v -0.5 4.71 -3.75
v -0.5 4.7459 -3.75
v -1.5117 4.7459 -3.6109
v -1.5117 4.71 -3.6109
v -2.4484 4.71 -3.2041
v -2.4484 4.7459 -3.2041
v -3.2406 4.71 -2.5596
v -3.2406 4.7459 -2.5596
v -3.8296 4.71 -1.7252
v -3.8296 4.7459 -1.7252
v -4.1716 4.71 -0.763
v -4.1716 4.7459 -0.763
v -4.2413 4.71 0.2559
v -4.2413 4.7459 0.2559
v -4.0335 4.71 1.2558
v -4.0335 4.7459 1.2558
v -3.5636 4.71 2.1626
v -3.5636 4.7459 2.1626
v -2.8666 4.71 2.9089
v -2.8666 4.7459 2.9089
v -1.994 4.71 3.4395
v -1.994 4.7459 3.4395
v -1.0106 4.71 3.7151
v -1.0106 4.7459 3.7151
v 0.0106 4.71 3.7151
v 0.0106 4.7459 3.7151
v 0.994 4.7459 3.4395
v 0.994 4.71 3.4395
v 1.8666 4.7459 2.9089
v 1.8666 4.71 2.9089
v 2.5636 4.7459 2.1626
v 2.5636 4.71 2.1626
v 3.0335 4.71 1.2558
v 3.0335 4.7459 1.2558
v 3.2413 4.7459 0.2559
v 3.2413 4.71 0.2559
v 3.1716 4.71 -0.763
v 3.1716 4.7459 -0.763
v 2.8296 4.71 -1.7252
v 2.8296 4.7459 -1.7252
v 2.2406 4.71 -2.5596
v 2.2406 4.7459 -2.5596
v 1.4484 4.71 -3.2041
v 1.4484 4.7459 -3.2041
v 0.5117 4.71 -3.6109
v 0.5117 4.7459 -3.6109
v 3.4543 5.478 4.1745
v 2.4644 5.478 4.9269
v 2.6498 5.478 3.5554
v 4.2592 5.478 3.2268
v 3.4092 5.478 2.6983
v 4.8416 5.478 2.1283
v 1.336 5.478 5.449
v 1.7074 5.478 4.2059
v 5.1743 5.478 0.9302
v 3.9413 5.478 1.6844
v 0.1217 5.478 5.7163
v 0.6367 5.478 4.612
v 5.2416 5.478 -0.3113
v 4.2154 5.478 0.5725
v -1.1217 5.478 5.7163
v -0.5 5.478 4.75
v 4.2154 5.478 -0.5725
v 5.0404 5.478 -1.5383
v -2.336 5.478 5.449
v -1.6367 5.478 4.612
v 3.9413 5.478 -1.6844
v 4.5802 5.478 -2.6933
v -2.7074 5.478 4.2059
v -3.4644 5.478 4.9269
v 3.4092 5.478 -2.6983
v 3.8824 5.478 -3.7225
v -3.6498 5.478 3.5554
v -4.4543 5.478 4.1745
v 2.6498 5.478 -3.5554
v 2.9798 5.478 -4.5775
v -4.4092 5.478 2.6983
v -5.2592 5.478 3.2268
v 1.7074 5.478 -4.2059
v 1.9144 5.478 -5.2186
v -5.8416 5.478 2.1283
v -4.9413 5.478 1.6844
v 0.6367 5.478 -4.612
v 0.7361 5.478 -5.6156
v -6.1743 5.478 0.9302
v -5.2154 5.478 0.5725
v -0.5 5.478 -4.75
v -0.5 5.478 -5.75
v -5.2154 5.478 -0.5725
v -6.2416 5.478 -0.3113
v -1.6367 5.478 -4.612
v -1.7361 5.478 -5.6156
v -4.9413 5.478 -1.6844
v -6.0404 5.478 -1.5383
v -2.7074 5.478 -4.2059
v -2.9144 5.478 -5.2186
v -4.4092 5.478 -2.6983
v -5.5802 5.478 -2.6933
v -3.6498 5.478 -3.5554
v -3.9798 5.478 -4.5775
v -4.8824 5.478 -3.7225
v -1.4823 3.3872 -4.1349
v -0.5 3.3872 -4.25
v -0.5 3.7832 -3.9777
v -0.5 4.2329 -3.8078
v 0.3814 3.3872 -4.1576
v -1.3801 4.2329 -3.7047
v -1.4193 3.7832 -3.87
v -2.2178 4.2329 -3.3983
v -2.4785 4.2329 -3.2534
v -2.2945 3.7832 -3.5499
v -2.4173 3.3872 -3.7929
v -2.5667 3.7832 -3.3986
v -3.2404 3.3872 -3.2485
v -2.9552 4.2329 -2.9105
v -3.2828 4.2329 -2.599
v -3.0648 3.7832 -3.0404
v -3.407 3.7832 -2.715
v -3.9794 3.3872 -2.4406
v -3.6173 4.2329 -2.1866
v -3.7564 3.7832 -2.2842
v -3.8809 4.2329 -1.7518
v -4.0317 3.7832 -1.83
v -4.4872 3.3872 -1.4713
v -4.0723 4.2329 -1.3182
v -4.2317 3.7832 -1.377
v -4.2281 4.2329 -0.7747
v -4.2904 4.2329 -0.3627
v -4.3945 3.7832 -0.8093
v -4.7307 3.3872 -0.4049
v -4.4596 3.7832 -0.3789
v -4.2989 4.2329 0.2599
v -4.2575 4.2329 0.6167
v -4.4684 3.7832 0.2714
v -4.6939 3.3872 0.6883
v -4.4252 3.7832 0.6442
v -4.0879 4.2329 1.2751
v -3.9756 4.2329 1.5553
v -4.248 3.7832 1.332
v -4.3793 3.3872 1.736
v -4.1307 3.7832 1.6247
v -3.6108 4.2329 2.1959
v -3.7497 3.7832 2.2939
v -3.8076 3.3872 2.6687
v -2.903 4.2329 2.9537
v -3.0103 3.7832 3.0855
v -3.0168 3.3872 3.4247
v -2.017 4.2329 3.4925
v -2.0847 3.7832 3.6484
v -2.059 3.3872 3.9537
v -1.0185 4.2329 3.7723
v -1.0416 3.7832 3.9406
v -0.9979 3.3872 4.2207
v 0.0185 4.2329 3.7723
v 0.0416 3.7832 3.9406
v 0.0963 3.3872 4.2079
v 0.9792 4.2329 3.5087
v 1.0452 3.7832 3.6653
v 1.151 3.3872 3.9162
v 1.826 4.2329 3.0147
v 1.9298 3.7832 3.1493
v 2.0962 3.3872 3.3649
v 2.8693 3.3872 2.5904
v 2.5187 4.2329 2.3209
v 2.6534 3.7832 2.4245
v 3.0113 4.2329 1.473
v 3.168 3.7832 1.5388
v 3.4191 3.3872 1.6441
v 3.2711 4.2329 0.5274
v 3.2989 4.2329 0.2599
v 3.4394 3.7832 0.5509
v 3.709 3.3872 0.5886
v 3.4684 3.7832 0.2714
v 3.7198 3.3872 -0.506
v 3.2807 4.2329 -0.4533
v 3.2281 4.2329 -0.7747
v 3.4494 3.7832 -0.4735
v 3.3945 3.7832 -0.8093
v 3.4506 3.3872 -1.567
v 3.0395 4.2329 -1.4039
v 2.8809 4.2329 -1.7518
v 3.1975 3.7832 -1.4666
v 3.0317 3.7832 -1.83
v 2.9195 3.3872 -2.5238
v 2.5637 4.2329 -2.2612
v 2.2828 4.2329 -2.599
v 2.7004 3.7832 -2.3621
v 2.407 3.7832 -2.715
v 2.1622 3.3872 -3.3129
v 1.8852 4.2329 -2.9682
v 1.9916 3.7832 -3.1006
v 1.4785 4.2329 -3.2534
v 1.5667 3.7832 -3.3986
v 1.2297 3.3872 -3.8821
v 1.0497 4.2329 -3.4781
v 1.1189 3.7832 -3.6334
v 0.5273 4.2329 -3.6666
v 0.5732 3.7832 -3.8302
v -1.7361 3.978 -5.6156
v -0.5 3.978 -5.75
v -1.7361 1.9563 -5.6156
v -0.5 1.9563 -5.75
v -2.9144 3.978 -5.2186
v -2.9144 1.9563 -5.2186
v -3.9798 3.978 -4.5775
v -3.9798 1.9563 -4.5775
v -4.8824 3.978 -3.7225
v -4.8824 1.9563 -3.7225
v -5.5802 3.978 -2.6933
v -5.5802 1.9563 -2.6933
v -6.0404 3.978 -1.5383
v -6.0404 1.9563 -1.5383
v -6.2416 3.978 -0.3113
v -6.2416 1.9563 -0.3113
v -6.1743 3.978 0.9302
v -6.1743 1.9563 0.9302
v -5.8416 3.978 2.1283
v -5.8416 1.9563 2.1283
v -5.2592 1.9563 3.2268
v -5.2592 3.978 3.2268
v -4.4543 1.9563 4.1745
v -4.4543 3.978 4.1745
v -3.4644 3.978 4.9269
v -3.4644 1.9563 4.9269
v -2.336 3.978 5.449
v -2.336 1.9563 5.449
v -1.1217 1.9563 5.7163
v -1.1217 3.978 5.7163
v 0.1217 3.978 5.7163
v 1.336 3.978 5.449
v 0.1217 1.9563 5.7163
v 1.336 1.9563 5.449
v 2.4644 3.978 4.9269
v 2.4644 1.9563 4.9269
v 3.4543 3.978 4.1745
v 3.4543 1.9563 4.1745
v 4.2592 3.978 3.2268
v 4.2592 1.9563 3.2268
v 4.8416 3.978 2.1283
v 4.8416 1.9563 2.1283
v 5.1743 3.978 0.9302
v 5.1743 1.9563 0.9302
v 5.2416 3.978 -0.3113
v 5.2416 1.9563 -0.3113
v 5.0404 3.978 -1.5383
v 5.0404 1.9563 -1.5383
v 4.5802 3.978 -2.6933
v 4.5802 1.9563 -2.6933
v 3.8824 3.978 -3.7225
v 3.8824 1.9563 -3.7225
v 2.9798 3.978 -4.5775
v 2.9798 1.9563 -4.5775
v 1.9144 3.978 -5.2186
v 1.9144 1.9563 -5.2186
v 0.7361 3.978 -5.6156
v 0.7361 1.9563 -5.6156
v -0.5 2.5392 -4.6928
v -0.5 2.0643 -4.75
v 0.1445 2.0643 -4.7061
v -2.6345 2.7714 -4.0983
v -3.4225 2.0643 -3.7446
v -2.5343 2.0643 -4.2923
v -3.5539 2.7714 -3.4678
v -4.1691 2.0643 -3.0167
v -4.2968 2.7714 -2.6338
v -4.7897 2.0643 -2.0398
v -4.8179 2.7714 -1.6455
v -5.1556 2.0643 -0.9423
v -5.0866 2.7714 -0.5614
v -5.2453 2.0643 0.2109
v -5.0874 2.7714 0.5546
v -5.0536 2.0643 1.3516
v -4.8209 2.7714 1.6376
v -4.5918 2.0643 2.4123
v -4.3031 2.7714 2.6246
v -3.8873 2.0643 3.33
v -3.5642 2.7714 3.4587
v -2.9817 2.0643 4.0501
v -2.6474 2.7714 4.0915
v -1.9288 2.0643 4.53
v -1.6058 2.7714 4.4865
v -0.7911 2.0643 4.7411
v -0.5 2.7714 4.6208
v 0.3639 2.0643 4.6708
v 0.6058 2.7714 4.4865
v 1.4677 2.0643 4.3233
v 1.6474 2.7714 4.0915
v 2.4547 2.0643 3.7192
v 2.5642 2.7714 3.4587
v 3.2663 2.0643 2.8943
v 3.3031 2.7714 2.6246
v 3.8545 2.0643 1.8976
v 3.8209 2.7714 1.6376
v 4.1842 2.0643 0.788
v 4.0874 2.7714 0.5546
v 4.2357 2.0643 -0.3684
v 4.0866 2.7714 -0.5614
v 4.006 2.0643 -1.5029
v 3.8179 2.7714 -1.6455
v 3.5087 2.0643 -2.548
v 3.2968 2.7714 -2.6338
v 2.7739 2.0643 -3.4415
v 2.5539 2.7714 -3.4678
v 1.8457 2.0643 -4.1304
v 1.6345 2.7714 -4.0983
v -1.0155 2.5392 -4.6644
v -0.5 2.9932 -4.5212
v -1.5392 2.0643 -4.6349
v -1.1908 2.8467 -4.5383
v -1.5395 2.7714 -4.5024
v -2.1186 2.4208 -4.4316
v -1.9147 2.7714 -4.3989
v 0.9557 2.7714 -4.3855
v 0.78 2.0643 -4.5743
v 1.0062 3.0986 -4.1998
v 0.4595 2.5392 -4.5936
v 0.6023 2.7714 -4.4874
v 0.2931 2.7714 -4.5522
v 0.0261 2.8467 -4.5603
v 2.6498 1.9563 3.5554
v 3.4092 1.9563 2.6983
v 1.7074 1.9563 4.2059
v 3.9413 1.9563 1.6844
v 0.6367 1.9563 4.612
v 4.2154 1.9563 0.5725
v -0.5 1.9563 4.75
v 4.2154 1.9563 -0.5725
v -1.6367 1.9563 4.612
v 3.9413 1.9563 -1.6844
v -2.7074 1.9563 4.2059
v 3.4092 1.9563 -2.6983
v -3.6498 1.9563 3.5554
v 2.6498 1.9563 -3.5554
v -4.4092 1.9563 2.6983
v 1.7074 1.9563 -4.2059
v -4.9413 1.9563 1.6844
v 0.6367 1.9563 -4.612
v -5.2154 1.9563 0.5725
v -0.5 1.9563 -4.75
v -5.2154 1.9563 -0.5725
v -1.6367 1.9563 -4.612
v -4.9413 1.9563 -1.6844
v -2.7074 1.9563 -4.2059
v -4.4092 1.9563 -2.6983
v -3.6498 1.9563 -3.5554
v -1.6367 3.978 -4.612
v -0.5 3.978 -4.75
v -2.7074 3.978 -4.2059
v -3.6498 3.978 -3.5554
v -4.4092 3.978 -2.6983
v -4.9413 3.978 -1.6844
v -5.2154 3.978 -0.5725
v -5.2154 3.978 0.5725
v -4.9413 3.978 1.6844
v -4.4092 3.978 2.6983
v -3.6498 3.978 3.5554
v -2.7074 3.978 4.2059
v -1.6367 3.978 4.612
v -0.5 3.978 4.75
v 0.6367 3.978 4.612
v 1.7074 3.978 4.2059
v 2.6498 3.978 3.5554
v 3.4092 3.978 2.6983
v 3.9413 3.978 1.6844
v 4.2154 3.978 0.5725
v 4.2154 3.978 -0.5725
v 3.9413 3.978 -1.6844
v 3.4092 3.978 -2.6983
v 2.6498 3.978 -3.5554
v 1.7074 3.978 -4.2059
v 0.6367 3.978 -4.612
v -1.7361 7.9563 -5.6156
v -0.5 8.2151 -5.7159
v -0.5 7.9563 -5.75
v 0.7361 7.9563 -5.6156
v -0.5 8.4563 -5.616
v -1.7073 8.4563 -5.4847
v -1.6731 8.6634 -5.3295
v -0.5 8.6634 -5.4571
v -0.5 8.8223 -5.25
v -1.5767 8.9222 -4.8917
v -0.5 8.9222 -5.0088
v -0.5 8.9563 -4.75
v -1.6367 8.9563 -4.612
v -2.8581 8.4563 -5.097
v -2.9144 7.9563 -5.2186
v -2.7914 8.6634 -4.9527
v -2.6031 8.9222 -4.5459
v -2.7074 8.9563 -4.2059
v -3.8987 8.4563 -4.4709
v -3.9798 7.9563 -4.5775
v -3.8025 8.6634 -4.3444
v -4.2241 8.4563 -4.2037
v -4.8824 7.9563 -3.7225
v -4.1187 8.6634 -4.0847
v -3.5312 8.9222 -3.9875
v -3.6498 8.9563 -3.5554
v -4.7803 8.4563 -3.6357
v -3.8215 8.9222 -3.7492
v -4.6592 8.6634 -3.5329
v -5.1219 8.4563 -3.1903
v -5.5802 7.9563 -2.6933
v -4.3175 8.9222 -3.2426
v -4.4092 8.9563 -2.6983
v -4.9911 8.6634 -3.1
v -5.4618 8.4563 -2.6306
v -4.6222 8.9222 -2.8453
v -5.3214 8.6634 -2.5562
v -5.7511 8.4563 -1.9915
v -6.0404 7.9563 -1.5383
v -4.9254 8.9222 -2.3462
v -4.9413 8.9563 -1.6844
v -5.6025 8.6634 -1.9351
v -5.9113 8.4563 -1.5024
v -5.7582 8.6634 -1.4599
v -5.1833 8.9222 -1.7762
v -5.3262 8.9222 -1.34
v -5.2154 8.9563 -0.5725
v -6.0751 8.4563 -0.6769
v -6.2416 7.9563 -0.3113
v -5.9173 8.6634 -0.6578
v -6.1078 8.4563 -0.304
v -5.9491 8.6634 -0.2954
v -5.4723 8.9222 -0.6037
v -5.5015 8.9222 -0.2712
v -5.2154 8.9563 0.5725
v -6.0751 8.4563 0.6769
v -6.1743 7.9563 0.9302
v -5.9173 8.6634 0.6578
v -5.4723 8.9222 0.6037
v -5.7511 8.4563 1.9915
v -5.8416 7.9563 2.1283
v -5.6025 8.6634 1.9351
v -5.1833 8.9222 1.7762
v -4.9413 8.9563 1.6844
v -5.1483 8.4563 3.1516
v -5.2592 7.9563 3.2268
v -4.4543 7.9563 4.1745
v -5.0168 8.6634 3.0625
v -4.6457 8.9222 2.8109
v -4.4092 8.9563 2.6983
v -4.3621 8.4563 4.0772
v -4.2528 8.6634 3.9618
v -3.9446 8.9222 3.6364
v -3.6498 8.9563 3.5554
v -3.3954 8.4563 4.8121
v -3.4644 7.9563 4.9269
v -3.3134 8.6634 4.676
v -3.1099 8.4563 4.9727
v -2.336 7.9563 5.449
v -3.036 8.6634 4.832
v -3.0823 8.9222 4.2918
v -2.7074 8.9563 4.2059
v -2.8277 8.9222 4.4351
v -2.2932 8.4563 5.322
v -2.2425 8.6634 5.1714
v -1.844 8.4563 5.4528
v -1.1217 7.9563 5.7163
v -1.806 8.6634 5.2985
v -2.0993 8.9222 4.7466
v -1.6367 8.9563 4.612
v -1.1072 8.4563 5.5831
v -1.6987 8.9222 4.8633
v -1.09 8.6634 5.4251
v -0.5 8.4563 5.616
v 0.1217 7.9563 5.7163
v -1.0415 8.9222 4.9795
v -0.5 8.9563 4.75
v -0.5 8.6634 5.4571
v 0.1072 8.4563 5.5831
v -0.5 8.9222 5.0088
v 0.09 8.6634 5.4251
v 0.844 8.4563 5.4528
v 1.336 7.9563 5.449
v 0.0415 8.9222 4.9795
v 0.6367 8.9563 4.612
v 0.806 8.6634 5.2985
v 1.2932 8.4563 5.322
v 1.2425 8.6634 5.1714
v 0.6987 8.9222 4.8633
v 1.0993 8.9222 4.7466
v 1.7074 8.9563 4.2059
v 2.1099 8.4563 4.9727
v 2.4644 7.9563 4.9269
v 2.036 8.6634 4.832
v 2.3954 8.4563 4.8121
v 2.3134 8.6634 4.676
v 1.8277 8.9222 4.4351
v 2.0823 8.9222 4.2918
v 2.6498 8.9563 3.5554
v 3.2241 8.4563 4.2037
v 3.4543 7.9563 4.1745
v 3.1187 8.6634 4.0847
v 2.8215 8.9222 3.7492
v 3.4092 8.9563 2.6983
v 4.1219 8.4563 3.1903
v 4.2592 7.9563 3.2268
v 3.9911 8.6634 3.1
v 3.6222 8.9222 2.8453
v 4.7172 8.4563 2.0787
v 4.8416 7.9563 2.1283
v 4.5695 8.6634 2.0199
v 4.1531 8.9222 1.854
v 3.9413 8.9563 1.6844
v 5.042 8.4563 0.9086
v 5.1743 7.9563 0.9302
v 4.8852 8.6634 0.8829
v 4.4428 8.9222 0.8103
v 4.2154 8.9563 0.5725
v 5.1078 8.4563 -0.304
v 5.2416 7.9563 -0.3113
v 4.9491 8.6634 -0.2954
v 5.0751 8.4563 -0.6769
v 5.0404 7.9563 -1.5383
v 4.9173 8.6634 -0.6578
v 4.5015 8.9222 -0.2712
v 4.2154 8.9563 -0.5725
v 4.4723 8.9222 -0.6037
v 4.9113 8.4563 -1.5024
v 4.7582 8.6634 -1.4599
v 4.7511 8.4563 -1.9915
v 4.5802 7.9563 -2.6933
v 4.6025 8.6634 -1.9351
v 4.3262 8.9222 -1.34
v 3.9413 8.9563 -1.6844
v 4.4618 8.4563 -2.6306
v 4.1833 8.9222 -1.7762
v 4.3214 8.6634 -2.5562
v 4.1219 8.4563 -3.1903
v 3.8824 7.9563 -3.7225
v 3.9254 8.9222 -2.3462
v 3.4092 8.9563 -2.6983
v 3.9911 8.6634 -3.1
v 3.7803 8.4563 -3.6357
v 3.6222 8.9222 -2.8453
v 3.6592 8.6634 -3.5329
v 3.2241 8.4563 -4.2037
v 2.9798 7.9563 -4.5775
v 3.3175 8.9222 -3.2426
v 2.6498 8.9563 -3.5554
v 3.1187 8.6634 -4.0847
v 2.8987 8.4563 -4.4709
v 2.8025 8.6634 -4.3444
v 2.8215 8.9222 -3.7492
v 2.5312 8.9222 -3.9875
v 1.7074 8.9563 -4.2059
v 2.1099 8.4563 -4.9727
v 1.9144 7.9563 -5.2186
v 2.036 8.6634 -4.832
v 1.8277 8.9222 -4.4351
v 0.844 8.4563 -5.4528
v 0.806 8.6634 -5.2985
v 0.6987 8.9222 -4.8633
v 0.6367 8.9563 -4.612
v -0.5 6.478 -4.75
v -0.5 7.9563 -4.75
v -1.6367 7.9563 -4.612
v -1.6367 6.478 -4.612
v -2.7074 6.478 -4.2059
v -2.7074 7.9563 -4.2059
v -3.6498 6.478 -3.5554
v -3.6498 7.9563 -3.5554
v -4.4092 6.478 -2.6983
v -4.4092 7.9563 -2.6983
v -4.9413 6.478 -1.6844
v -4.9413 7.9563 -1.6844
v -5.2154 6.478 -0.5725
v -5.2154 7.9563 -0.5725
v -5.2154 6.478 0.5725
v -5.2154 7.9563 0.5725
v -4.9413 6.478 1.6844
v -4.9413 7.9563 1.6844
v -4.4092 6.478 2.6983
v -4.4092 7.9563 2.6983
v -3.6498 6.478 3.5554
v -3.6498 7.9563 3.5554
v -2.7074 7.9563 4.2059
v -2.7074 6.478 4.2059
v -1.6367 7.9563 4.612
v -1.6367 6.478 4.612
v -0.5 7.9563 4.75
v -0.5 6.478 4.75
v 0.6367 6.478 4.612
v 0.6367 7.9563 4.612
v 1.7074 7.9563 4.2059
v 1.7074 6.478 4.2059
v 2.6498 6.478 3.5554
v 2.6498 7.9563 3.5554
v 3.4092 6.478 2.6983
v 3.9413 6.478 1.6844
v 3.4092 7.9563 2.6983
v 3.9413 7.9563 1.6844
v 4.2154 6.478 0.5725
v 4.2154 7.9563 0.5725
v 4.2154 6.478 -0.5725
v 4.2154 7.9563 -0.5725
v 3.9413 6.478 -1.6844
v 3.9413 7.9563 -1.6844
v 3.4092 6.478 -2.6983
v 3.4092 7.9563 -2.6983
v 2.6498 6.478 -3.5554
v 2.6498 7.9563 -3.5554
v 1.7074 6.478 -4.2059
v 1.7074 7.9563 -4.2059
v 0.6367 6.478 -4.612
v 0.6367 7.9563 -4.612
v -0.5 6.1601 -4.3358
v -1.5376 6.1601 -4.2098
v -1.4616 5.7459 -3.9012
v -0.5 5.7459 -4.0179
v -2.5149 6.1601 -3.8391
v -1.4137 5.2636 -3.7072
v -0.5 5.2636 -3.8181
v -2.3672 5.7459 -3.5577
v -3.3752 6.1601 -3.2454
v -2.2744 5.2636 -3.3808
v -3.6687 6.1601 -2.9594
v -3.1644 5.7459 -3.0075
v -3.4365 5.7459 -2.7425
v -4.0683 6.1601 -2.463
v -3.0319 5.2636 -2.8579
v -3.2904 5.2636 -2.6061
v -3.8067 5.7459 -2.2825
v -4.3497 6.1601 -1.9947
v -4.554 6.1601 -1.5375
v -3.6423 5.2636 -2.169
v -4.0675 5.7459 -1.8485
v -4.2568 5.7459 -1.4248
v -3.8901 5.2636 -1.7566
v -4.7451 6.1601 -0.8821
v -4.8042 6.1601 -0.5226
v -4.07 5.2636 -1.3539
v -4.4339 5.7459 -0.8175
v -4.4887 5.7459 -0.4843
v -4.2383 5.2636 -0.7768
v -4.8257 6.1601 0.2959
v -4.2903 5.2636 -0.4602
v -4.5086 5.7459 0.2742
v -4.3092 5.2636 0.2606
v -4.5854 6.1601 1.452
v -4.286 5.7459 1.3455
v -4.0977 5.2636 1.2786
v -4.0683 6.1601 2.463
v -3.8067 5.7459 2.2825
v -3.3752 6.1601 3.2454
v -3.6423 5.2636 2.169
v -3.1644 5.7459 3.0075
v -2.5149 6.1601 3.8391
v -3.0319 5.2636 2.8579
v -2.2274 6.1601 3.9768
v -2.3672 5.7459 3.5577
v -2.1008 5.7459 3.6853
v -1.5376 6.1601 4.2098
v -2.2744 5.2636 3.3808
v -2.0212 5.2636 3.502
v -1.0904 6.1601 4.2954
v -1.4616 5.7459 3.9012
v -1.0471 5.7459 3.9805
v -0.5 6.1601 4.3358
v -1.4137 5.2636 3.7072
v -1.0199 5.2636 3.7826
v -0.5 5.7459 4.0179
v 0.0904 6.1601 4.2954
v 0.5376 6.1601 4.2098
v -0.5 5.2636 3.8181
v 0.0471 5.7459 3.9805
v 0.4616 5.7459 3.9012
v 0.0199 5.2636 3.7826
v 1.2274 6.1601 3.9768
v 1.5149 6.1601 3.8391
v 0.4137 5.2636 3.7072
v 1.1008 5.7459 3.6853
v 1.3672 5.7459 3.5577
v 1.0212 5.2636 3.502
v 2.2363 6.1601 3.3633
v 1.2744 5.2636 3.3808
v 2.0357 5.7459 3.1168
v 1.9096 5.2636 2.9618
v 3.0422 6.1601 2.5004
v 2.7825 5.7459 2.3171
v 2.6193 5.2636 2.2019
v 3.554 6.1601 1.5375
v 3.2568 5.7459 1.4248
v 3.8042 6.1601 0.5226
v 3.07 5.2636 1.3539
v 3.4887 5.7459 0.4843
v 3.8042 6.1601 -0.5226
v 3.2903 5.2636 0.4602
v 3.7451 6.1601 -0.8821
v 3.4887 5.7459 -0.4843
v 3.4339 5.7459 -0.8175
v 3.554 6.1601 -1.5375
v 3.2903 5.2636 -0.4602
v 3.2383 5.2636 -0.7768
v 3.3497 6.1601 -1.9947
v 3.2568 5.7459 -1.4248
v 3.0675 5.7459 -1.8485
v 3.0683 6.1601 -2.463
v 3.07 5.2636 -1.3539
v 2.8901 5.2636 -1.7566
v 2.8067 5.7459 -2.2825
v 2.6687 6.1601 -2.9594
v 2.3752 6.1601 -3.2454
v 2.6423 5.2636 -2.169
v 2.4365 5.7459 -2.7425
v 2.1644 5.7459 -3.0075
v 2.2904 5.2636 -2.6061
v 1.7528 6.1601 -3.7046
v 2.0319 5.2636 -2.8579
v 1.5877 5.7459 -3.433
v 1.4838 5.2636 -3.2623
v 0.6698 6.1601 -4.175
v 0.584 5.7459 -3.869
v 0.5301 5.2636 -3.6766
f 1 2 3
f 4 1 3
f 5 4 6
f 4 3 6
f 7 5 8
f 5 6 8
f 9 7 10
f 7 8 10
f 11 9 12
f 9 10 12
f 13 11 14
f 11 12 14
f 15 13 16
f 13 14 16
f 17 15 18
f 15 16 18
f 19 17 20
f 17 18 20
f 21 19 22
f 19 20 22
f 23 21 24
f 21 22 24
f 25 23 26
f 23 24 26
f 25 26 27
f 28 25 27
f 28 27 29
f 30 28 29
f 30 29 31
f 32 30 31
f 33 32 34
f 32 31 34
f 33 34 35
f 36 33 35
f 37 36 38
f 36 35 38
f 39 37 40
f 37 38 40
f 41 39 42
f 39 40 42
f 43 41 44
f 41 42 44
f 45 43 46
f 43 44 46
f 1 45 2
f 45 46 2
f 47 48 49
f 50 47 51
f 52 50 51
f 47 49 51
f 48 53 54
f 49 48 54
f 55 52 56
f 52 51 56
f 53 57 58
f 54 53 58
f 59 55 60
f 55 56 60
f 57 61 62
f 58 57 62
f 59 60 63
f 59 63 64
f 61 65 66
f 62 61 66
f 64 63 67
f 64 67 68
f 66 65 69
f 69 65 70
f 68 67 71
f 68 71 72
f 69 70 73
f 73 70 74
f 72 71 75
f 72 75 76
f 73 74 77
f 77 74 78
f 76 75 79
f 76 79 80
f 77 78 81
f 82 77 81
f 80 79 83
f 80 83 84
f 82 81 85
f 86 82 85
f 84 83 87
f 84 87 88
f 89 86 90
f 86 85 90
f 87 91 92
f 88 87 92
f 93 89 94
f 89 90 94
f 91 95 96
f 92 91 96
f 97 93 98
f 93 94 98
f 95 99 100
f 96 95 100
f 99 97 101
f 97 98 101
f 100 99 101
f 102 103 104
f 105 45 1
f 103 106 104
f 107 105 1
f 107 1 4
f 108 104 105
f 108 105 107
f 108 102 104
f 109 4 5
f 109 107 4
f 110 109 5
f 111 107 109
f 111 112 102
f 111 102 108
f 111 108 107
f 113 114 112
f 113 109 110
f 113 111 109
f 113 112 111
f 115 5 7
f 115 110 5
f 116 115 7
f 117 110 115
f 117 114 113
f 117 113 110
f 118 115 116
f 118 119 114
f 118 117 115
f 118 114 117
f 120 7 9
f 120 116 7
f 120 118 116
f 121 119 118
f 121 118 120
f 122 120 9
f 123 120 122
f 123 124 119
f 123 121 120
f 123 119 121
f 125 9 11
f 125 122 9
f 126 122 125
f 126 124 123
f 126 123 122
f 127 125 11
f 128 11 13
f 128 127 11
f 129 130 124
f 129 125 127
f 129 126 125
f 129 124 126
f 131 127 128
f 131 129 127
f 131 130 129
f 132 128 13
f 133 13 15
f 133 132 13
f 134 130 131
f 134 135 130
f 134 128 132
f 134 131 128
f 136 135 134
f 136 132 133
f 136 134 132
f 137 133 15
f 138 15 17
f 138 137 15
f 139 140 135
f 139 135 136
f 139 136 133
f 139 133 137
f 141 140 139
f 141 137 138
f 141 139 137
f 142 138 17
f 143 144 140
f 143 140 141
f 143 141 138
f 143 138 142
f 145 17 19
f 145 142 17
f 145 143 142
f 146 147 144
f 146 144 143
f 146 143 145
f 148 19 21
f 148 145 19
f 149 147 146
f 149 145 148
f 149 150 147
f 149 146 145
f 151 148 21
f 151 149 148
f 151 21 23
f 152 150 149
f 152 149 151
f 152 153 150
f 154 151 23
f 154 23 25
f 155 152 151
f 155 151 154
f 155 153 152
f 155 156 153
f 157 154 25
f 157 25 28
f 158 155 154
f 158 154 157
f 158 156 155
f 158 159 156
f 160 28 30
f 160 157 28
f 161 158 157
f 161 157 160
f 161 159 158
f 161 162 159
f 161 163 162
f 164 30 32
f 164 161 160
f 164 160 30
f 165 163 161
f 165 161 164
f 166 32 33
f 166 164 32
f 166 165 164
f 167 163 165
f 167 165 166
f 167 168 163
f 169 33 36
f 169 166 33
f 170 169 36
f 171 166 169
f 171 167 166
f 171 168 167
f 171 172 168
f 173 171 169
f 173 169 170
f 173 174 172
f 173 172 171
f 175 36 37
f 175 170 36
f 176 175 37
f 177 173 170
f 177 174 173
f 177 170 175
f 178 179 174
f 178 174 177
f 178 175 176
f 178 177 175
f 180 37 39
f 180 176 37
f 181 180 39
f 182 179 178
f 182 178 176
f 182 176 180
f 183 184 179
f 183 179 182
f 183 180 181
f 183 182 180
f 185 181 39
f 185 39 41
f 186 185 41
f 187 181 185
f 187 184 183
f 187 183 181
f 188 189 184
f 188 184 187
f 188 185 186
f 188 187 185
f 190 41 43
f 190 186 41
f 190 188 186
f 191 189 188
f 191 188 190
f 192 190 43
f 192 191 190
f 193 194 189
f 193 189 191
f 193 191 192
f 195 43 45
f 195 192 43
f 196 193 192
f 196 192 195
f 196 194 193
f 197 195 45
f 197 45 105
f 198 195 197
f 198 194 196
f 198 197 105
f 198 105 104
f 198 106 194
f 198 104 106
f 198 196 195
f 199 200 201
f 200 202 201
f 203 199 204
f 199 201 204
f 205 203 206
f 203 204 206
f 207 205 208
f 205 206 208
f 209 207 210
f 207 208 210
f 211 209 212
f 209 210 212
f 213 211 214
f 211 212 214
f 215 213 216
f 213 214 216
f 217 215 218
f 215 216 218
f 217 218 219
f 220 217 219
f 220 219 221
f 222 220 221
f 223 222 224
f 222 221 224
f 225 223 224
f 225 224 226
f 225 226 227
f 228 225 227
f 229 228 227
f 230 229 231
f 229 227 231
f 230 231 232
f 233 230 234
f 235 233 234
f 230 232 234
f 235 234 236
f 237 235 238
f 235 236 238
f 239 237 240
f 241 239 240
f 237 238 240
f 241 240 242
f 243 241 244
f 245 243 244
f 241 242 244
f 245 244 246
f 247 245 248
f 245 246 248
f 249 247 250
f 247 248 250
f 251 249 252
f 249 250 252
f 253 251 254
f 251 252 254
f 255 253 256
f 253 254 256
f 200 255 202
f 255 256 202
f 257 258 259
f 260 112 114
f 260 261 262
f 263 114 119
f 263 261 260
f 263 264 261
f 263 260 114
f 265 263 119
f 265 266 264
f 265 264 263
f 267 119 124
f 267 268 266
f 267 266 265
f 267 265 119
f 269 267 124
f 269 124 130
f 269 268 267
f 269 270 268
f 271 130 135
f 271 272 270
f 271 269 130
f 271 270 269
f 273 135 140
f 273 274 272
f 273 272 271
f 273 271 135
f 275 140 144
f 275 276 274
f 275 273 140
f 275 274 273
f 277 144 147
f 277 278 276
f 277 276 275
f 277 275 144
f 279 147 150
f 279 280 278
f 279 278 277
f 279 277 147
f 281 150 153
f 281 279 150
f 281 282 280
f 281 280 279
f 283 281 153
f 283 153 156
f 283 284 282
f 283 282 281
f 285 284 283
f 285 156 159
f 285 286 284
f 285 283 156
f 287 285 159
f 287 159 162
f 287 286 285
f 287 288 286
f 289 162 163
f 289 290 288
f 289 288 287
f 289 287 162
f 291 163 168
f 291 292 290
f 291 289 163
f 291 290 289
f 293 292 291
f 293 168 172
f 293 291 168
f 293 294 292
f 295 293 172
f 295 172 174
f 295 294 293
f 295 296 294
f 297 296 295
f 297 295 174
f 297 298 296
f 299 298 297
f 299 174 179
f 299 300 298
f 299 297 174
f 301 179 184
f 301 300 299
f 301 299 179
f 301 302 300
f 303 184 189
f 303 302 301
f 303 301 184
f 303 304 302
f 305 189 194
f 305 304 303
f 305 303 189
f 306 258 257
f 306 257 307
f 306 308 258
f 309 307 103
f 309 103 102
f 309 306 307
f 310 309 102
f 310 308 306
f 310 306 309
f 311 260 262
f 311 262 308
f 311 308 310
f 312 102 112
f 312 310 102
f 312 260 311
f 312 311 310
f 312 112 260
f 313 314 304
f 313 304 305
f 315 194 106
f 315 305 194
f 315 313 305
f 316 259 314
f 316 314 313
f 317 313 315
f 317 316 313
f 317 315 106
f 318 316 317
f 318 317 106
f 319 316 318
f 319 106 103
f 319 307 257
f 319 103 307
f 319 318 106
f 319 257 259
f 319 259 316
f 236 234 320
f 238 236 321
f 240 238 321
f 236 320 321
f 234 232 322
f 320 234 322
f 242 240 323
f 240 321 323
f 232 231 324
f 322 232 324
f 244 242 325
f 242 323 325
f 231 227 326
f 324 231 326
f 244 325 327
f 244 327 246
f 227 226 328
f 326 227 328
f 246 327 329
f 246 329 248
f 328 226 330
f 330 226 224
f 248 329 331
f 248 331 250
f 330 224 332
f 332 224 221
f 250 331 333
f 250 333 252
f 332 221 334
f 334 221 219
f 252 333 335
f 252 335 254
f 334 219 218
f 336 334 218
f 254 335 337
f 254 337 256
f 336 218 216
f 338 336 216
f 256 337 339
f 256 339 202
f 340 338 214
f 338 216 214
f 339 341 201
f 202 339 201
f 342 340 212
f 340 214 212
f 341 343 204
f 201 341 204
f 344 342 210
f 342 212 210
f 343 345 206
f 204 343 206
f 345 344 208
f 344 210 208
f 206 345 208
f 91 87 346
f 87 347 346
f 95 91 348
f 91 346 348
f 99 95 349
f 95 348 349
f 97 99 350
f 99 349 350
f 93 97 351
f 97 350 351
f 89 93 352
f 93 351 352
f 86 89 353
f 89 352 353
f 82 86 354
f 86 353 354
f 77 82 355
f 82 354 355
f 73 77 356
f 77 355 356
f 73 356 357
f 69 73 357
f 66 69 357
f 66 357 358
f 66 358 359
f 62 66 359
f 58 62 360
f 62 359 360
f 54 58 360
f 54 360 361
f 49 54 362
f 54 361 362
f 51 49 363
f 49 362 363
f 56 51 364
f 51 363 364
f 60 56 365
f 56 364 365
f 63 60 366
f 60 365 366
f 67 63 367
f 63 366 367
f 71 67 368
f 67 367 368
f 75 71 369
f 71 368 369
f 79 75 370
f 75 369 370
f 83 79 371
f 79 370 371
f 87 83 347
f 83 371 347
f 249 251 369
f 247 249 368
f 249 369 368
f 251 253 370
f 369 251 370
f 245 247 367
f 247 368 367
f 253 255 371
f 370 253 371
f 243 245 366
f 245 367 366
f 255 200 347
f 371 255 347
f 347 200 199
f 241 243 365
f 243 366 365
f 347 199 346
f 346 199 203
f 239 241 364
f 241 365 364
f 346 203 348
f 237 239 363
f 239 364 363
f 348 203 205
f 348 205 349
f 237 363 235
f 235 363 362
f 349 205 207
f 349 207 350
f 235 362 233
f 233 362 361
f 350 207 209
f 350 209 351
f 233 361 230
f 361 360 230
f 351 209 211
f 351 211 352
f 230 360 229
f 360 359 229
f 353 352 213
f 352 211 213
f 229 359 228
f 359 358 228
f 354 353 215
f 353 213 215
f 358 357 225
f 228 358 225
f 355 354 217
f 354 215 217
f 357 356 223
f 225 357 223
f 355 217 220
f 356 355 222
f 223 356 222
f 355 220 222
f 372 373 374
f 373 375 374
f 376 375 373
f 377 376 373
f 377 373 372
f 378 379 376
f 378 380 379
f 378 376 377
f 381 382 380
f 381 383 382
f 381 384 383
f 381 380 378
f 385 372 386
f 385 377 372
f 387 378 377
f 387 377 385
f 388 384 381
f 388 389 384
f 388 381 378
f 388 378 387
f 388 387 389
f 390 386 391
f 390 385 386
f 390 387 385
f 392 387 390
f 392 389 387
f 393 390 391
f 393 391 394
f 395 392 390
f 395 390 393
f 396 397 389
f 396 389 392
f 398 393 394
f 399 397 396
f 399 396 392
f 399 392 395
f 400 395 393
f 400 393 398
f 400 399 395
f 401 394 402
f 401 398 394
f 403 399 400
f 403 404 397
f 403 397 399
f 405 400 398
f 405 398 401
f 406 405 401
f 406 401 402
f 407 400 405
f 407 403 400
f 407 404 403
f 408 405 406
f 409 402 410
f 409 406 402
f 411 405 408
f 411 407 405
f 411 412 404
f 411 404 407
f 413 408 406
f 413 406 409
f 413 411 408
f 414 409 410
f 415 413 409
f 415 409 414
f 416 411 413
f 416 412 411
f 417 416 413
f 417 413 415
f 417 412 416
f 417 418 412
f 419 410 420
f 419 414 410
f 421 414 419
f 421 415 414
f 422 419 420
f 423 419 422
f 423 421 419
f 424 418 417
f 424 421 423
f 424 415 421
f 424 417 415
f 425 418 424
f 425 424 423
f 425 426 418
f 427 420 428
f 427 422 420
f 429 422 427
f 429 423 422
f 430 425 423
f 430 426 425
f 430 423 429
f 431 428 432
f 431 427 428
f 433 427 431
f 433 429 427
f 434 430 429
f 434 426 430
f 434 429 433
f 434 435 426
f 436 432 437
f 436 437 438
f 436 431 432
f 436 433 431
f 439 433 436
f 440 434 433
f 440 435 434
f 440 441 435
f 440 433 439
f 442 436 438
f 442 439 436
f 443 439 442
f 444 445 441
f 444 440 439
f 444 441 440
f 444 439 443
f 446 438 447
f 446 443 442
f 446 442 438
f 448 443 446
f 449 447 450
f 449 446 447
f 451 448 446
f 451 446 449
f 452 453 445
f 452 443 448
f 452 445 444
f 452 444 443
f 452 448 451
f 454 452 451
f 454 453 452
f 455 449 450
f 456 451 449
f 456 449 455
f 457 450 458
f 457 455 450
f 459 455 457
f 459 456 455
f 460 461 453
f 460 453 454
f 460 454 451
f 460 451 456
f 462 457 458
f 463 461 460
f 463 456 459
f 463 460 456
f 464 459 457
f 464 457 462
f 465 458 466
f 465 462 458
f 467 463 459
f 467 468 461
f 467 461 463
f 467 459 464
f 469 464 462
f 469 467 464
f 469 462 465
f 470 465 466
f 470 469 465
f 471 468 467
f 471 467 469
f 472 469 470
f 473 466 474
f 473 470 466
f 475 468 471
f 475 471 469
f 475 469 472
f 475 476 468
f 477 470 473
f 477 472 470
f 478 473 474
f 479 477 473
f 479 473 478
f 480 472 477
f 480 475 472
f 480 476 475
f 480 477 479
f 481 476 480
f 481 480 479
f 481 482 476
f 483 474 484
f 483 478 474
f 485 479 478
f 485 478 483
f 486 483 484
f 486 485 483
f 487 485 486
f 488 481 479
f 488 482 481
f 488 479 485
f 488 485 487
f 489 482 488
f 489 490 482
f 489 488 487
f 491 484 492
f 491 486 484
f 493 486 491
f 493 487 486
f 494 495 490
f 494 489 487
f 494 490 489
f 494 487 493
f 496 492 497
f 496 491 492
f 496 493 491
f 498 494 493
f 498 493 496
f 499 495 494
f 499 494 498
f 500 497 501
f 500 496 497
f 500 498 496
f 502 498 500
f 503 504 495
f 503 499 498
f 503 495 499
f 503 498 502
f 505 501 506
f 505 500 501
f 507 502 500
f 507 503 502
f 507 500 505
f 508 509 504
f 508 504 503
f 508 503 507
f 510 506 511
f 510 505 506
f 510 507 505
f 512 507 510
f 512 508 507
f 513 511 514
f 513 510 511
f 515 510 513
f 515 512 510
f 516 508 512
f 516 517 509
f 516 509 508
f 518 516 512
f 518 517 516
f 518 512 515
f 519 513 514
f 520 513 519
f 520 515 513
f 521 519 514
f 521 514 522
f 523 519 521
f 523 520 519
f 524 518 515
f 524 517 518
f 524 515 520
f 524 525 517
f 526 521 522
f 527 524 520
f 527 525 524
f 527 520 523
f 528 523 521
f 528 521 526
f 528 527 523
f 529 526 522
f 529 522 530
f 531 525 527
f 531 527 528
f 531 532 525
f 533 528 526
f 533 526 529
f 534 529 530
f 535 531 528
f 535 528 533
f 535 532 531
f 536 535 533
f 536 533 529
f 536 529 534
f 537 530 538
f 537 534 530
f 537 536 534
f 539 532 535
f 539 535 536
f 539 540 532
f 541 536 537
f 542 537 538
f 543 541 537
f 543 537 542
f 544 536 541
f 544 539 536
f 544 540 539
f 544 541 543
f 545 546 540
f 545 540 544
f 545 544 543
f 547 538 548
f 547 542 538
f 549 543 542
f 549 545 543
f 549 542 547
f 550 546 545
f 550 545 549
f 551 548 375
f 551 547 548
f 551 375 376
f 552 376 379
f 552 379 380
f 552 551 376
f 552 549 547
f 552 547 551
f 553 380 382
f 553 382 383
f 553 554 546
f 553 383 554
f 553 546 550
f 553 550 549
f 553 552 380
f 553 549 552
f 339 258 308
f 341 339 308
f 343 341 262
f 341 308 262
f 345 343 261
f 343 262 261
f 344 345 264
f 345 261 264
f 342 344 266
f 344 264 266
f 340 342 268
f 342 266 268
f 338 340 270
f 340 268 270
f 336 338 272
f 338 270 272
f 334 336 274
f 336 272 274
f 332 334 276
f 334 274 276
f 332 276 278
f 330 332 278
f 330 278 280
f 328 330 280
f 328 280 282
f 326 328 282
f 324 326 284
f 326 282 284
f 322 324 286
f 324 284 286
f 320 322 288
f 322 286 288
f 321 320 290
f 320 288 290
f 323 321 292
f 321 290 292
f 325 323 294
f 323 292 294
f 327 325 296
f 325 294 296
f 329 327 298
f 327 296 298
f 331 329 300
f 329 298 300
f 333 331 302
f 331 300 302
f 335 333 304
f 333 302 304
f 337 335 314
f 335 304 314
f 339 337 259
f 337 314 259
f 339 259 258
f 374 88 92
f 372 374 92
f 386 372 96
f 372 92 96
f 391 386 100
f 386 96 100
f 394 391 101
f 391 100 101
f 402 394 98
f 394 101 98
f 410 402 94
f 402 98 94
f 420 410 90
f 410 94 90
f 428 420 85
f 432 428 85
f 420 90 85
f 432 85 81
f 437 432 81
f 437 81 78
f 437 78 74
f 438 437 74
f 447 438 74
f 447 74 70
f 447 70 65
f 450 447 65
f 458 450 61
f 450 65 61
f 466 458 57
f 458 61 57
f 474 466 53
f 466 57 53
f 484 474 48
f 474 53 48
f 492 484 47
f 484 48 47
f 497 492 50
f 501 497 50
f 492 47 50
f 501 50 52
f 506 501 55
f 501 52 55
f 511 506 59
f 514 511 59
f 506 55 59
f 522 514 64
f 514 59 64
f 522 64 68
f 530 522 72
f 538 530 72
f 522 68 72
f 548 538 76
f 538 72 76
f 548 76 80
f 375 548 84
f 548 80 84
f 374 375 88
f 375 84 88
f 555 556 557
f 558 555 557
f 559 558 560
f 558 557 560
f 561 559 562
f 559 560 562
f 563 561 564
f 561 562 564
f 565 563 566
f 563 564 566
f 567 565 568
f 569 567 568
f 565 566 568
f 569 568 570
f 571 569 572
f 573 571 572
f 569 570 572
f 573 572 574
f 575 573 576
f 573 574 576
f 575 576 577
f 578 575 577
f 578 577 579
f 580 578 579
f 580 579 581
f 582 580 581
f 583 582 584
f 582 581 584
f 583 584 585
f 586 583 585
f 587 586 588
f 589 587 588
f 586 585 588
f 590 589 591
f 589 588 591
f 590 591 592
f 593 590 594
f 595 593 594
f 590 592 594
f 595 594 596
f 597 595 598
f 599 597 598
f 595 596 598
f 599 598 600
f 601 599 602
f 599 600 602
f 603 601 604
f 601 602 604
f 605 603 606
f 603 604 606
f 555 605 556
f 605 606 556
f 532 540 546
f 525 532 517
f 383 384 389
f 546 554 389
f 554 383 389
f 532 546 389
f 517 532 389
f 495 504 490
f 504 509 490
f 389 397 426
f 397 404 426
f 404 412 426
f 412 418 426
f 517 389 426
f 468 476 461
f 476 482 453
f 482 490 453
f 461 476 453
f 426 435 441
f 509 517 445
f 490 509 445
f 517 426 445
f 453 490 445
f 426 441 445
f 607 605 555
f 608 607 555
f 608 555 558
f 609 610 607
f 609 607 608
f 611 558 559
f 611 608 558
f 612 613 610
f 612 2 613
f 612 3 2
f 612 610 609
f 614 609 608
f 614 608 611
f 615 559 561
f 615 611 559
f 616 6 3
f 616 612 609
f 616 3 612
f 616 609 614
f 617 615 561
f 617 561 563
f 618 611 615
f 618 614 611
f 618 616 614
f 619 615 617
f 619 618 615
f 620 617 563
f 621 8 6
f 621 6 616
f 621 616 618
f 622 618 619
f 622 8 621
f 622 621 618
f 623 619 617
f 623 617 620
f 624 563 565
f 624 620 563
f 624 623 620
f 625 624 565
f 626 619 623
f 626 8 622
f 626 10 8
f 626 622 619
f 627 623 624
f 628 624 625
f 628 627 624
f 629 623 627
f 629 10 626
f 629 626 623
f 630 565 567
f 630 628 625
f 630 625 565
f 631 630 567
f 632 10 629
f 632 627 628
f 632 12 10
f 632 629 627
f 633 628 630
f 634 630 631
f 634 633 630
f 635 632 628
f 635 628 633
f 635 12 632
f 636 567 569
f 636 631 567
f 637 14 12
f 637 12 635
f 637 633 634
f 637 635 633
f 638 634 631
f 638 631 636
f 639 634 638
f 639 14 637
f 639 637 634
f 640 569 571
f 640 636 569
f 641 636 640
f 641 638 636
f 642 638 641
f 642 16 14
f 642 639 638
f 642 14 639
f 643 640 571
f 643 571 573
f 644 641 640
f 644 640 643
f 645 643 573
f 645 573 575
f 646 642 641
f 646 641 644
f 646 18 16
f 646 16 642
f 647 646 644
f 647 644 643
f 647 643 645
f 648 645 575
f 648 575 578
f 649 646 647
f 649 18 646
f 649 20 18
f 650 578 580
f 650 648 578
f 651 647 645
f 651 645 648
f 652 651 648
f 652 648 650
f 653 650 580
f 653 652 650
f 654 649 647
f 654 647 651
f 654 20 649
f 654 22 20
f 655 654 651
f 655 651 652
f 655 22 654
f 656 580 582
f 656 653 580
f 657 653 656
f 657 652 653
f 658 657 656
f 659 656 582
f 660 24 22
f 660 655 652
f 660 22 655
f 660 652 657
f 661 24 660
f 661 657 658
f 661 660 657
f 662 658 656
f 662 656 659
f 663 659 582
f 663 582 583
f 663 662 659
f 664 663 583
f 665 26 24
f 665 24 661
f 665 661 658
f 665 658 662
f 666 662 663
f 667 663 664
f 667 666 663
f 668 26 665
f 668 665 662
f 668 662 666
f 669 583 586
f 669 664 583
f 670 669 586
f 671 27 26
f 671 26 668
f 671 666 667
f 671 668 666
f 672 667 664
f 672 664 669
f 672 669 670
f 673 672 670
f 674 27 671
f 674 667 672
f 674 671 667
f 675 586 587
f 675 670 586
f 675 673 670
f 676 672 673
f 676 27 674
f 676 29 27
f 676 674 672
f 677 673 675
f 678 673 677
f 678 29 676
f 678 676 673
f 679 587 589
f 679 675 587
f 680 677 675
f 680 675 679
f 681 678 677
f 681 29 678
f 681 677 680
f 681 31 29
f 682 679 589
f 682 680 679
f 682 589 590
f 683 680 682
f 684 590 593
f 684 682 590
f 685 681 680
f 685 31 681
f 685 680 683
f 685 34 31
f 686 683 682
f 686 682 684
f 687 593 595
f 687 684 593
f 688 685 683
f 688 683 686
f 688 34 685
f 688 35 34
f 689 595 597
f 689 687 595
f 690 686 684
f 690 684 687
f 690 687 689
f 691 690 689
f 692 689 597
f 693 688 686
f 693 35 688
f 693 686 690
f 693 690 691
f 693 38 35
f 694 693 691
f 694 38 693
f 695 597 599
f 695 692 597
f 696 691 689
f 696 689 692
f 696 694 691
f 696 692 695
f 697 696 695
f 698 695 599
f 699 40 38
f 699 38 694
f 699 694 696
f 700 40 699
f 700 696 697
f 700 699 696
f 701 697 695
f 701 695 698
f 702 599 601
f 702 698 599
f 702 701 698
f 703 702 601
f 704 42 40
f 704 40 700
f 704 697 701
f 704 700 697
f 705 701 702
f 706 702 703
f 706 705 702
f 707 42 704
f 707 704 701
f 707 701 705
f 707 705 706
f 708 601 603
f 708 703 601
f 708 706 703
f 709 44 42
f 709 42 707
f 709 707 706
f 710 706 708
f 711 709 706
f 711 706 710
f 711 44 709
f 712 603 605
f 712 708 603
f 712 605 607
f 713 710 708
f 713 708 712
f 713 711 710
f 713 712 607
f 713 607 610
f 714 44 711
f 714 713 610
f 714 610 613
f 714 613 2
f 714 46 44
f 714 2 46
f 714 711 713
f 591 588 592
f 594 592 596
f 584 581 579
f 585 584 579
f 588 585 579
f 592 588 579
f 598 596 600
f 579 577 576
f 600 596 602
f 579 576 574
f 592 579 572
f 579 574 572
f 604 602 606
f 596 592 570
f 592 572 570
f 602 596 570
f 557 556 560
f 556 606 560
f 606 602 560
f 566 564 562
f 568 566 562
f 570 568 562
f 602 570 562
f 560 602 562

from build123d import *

# Parameters (mm, degrees)
FILLET1_R = 2
FILLET2_R = 2
FILLET3_R = 2
FILLET4_R = 1


with BuildPart() as part:
    # Sketch1 → Revolve1 (revolve)
    with BuildSketch(Plane.XY, mode=Mode.PRIVATE) as revolve1_sk:
        Polygon((-0.5, 8.956259778), (-6.25, 8.956259778), (-6.25, 5.477980263), (-5.25, 5.477980263), (-5.25, 3.977980263), (-6.25, 3.977980263), (-6.25, 1.956259778), (-5.25, 1.956259778), (-5.25, 2.977980263), (-4.25, 2.977980263), (-4.25, 6.477980263), (-5.25, 6.477980263), (-5.25, 7.956259778), (-0.5, 7.956259778), align=None)
    revolve(revolve1_sk.sketch.rotate(Axis((-0.5, 1.956259778, 0), (0, 1, 0)), 270), axis=Axis((-0.5, 1.956259778, 0), (0, 1, 0)))

    # Fillet1
    # the kernel refuses this fillet: 2 mm, written as the material it takes off along each edge
    with BuildSketch(Plane(origin=(-0.5, 2.977980263, 0), x_dir=(0, 0, -1), z_dir=(1, 0, 0))) as fillet1_piece_1:
        with BuildLine():
            CenterArc((5.75, 1.732050808), FILLET1_R, 180, 60)
            Line((3.75, 1.732050808), (3.71, 1.732050808))
            Line((3.71, 1.732050808), (3.71, 0))
            Line((3.71, 0), (3.75, -0.04))
            ThreePointArc((3.75, -0.04), (4.25, -0.04), (4.73, -0.034641016))
            Line((4.73, -0.034641016), (4.75, 0))
        make_face()
    revolve(axis=Axis((-0.5, 2.977980263, 0), (0, 1, 0)), mode=Mode.SUBTRACT)

    # Fillet2
    fillet2_edges = [part.edges().sort_by_distance(p)[0] for p in [
        (-0.5, 2.977980263, 4.75),
    ]]
    fillet(fillet2_edges, radius=FILLET2_R)

    # Fillet3
    # the kernel refuses this fillet: 2 mm, written as the material it takes off along each edge
    with BuildSketch(Plane(origin=(-0.5, 6.477980263, 0), x_dir=(0, 0, -1), z_dir=(1, 0, 0))) as fillet3_piece_1:
        with BuildLine():
            CenterArc((5.75, -1.732050808), FILLET3_R, 120, 60)
            Line((4.75, 0), (4.73, 0.034641016))
            ThreePointArc((4.73, 0.034641016), (4.25, 0.04), (3.75, 0.04))
            Line((3.75, 0.04), (3.71, 0))
            Line((3.71, 0), (3.71, -1.732050808))
            Line((3.71, -1.732050808), (3.75, -1.732050808))
        make_face()
    revolve(axis=Axis((-0.5, 6.477980263, 0), (0, 1, 0)), mode=Mode.SUBTRACT)

    # Fillet4
    fillet4_edges = [part.edges().sort_by_distance(p)[0] for p in [
        (-0.5, 8.956259778, 5.75),
    ]]
    fillet(fillet4_edges, radius=FILLET4_R)


solid = part.part
